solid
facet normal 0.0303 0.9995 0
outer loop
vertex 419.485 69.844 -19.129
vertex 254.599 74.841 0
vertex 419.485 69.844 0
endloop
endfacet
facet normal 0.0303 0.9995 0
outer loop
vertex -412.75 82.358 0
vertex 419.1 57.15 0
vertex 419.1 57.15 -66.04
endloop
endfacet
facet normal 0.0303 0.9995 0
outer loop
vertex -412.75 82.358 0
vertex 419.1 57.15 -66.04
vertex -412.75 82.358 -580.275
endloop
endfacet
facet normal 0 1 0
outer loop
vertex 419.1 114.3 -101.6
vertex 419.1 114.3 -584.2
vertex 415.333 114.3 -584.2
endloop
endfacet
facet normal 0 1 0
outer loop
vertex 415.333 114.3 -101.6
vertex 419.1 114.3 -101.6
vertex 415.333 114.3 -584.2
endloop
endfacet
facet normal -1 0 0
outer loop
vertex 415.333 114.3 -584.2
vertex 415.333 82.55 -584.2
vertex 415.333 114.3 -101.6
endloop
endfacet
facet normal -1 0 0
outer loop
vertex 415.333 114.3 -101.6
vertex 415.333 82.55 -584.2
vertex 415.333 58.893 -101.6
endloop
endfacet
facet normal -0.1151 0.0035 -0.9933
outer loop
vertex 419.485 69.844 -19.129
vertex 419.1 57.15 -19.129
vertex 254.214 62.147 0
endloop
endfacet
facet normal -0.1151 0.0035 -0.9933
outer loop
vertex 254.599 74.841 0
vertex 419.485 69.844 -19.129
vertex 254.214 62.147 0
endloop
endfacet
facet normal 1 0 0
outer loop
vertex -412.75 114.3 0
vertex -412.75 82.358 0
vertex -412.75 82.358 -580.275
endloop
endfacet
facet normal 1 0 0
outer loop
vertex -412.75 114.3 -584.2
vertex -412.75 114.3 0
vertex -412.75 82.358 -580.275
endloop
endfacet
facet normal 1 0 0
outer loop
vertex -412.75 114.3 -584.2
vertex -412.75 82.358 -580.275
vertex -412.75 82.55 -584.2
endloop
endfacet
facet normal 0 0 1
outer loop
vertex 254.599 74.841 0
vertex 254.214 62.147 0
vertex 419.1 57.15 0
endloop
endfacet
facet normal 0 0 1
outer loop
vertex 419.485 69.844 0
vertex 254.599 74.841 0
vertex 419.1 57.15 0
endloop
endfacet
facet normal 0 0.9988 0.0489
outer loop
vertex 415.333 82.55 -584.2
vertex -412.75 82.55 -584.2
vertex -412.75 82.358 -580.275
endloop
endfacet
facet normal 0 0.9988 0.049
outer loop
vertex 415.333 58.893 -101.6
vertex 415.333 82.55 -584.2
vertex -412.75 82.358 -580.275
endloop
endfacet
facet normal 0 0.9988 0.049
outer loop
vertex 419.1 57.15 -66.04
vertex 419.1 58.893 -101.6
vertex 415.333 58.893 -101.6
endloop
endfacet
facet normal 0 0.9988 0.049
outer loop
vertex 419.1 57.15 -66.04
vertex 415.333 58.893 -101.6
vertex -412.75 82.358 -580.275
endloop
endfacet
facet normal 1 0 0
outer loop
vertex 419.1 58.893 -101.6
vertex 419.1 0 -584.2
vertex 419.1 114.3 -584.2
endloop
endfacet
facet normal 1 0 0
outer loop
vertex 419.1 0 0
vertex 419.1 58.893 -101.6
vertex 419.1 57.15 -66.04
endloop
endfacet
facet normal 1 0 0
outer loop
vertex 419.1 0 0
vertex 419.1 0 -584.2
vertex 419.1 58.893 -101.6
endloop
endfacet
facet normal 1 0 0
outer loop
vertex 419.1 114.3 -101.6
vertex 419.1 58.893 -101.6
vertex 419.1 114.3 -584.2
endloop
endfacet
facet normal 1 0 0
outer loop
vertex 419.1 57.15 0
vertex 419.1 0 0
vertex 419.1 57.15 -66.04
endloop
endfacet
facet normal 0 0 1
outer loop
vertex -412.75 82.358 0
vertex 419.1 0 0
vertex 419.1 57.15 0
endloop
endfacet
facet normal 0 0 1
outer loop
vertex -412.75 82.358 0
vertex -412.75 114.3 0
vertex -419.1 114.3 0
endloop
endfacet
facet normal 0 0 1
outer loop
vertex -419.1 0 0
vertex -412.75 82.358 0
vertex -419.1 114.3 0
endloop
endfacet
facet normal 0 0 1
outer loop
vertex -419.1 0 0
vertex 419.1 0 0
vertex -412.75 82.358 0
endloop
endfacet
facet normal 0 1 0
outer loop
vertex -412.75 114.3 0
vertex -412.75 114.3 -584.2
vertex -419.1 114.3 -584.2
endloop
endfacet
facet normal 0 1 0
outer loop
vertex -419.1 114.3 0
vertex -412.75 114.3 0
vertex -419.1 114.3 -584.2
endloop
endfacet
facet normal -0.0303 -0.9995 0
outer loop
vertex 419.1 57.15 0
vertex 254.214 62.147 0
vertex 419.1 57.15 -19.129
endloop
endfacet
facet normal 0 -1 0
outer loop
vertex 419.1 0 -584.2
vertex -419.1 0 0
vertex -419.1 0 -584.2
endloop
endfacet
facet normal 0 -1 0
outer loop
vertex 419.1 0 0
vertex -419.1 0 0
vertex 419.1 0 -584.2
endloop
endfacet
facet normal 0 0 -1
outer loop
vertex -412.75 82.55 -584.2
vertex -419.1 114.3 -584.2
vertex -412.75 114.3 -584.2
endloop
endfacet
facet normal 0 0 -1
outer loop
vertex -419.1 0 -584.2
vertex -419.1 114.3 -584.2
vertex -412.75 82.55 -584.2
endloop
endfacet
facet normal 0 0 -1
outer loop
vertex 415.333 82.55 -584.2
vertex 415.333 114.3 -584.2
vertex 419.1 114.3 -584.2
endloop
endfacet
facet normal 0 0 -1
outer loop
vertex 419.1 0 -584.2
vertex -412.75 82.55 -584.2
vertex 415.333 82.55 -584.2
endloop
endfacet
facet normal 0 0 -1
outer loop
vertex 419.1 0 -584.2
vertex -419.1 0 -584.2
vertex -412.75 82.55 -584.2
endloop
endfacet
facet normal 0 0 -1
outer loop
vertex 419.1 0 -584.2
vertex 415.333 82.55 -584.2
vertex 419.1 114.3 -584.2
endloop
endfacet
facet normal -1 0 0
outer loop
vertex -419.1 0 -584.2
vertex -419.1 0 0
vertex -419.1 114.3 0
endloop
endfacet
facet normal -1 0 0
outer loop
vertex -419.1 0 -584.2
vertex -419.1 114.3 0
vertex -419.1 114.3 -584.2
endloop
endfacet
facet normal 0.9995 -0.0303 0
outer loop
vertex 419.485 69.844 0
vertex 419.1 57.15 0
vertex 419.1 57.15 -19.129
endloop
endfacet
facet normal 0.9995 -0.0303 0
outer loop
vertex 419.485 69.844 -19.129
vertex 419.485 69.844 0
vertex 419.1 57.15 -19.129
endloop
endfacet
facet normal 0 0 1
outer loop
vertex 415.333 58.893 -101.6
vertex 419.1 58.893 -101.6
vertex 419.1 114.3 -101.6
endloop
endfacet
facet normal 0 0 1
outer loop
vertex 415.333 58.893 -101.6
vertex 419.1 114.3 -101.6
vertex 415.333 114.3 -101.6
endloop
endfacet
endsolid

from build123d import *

# Parameters (mm, degrees)
BOSS_EXTRUDE2_DEPTH = 584.2
BOSS_EXTRUDE3_REACH = 1027.028
BOSS_EXTRUDE4_DEPTH = 114.3
BOSS_EXTRUDE5_DEPTH = 12.7


with BuildPart() as part:
    # Sketch3 → Boss-Extrude2 (new body)
    with BuildSketch(Plane.XY):
        Polygon((-419.1, 0), (419.1, 0), (419.1, 57.15), (-419.1, 82.55), align=None)
    extrude(amount=-BOSS_EXTRUDE2_DEPTH)

    # Boss-Extrude3: up to this face of the body (flat: up to its plane)
    boss_extrude3_end = Plane(part.part.faces().sort_by_distance((-419.1, 41.275, -292.1))[0])
    # Sketch4 → Boss-Extrude3 (add, up to the picked face)
    with BuildSketch(Plane(origin=(419.1, 0, 0), x_dir=(0, 0, -1), z_dir=(1, 0, 0)), mode=Mode.PRIVATE) as boss_extrude3_sk1:
        Polygon((66.04, 57.15), (66.04, 0), (584.2, 0), (584.2, 82.55), align=None)
    boss_extrude3_tool1 = split(extrude(boss_extrude3_sk1.sketch, amount=-BOSS_EXTRUDE3_REACH, mode=Mode.PRIVATE), bisect_by=boss_extrude3_end, keep=Keep.BOTH, mode=Mode.PRIVATE)
    add(boss_extrude3_tool1.solids().sort_by(Axis((419.1, 35.309848, -340.821818), (-1, 0, 0)))[0])

    # Sketch5 → Boss-Extrude4 (add)
    with BuildSketch(Plane(origin=(0, 0, 0), x_dir=(1, 0, 0), z_dir=(0, 1, 0))):
        Polygon((-419.1, 584.2), (-412.75, 584.2), (-412.75, 579.774242424), (-412.75, 6.35), (-412.75, 0), (-419.1, 0), align=None)
        Polygon((419.1, 584.2), (419.1, 101.6), (415.333086298, 101.6), (415.333086298, 579.638290514), (415.333086298, 584.2), align=None)
    extrude(amount=BOSS_EXTRUDE4_DEPTH)


with BuildPart() as body_2:
    # Sketch6 → Boss-Extrude5 (new body)
    with BuildSketch(Plane(origin=(2.114724771, 69.785917431, 0), x_dir=(0.9995411791453815, -0.03028912664076896, 0), z_dir=(0.03028912664076896, 0.9995411791453815, 0))):
        Polygon((252.21531488, 0), (417.176684592, 0), (417.176684592, 19.129276533), align=None)
    extrude(amount=BOSS_EXTRUDE5_DEPTH)


solid = Compound([part.part, body_2.part])
